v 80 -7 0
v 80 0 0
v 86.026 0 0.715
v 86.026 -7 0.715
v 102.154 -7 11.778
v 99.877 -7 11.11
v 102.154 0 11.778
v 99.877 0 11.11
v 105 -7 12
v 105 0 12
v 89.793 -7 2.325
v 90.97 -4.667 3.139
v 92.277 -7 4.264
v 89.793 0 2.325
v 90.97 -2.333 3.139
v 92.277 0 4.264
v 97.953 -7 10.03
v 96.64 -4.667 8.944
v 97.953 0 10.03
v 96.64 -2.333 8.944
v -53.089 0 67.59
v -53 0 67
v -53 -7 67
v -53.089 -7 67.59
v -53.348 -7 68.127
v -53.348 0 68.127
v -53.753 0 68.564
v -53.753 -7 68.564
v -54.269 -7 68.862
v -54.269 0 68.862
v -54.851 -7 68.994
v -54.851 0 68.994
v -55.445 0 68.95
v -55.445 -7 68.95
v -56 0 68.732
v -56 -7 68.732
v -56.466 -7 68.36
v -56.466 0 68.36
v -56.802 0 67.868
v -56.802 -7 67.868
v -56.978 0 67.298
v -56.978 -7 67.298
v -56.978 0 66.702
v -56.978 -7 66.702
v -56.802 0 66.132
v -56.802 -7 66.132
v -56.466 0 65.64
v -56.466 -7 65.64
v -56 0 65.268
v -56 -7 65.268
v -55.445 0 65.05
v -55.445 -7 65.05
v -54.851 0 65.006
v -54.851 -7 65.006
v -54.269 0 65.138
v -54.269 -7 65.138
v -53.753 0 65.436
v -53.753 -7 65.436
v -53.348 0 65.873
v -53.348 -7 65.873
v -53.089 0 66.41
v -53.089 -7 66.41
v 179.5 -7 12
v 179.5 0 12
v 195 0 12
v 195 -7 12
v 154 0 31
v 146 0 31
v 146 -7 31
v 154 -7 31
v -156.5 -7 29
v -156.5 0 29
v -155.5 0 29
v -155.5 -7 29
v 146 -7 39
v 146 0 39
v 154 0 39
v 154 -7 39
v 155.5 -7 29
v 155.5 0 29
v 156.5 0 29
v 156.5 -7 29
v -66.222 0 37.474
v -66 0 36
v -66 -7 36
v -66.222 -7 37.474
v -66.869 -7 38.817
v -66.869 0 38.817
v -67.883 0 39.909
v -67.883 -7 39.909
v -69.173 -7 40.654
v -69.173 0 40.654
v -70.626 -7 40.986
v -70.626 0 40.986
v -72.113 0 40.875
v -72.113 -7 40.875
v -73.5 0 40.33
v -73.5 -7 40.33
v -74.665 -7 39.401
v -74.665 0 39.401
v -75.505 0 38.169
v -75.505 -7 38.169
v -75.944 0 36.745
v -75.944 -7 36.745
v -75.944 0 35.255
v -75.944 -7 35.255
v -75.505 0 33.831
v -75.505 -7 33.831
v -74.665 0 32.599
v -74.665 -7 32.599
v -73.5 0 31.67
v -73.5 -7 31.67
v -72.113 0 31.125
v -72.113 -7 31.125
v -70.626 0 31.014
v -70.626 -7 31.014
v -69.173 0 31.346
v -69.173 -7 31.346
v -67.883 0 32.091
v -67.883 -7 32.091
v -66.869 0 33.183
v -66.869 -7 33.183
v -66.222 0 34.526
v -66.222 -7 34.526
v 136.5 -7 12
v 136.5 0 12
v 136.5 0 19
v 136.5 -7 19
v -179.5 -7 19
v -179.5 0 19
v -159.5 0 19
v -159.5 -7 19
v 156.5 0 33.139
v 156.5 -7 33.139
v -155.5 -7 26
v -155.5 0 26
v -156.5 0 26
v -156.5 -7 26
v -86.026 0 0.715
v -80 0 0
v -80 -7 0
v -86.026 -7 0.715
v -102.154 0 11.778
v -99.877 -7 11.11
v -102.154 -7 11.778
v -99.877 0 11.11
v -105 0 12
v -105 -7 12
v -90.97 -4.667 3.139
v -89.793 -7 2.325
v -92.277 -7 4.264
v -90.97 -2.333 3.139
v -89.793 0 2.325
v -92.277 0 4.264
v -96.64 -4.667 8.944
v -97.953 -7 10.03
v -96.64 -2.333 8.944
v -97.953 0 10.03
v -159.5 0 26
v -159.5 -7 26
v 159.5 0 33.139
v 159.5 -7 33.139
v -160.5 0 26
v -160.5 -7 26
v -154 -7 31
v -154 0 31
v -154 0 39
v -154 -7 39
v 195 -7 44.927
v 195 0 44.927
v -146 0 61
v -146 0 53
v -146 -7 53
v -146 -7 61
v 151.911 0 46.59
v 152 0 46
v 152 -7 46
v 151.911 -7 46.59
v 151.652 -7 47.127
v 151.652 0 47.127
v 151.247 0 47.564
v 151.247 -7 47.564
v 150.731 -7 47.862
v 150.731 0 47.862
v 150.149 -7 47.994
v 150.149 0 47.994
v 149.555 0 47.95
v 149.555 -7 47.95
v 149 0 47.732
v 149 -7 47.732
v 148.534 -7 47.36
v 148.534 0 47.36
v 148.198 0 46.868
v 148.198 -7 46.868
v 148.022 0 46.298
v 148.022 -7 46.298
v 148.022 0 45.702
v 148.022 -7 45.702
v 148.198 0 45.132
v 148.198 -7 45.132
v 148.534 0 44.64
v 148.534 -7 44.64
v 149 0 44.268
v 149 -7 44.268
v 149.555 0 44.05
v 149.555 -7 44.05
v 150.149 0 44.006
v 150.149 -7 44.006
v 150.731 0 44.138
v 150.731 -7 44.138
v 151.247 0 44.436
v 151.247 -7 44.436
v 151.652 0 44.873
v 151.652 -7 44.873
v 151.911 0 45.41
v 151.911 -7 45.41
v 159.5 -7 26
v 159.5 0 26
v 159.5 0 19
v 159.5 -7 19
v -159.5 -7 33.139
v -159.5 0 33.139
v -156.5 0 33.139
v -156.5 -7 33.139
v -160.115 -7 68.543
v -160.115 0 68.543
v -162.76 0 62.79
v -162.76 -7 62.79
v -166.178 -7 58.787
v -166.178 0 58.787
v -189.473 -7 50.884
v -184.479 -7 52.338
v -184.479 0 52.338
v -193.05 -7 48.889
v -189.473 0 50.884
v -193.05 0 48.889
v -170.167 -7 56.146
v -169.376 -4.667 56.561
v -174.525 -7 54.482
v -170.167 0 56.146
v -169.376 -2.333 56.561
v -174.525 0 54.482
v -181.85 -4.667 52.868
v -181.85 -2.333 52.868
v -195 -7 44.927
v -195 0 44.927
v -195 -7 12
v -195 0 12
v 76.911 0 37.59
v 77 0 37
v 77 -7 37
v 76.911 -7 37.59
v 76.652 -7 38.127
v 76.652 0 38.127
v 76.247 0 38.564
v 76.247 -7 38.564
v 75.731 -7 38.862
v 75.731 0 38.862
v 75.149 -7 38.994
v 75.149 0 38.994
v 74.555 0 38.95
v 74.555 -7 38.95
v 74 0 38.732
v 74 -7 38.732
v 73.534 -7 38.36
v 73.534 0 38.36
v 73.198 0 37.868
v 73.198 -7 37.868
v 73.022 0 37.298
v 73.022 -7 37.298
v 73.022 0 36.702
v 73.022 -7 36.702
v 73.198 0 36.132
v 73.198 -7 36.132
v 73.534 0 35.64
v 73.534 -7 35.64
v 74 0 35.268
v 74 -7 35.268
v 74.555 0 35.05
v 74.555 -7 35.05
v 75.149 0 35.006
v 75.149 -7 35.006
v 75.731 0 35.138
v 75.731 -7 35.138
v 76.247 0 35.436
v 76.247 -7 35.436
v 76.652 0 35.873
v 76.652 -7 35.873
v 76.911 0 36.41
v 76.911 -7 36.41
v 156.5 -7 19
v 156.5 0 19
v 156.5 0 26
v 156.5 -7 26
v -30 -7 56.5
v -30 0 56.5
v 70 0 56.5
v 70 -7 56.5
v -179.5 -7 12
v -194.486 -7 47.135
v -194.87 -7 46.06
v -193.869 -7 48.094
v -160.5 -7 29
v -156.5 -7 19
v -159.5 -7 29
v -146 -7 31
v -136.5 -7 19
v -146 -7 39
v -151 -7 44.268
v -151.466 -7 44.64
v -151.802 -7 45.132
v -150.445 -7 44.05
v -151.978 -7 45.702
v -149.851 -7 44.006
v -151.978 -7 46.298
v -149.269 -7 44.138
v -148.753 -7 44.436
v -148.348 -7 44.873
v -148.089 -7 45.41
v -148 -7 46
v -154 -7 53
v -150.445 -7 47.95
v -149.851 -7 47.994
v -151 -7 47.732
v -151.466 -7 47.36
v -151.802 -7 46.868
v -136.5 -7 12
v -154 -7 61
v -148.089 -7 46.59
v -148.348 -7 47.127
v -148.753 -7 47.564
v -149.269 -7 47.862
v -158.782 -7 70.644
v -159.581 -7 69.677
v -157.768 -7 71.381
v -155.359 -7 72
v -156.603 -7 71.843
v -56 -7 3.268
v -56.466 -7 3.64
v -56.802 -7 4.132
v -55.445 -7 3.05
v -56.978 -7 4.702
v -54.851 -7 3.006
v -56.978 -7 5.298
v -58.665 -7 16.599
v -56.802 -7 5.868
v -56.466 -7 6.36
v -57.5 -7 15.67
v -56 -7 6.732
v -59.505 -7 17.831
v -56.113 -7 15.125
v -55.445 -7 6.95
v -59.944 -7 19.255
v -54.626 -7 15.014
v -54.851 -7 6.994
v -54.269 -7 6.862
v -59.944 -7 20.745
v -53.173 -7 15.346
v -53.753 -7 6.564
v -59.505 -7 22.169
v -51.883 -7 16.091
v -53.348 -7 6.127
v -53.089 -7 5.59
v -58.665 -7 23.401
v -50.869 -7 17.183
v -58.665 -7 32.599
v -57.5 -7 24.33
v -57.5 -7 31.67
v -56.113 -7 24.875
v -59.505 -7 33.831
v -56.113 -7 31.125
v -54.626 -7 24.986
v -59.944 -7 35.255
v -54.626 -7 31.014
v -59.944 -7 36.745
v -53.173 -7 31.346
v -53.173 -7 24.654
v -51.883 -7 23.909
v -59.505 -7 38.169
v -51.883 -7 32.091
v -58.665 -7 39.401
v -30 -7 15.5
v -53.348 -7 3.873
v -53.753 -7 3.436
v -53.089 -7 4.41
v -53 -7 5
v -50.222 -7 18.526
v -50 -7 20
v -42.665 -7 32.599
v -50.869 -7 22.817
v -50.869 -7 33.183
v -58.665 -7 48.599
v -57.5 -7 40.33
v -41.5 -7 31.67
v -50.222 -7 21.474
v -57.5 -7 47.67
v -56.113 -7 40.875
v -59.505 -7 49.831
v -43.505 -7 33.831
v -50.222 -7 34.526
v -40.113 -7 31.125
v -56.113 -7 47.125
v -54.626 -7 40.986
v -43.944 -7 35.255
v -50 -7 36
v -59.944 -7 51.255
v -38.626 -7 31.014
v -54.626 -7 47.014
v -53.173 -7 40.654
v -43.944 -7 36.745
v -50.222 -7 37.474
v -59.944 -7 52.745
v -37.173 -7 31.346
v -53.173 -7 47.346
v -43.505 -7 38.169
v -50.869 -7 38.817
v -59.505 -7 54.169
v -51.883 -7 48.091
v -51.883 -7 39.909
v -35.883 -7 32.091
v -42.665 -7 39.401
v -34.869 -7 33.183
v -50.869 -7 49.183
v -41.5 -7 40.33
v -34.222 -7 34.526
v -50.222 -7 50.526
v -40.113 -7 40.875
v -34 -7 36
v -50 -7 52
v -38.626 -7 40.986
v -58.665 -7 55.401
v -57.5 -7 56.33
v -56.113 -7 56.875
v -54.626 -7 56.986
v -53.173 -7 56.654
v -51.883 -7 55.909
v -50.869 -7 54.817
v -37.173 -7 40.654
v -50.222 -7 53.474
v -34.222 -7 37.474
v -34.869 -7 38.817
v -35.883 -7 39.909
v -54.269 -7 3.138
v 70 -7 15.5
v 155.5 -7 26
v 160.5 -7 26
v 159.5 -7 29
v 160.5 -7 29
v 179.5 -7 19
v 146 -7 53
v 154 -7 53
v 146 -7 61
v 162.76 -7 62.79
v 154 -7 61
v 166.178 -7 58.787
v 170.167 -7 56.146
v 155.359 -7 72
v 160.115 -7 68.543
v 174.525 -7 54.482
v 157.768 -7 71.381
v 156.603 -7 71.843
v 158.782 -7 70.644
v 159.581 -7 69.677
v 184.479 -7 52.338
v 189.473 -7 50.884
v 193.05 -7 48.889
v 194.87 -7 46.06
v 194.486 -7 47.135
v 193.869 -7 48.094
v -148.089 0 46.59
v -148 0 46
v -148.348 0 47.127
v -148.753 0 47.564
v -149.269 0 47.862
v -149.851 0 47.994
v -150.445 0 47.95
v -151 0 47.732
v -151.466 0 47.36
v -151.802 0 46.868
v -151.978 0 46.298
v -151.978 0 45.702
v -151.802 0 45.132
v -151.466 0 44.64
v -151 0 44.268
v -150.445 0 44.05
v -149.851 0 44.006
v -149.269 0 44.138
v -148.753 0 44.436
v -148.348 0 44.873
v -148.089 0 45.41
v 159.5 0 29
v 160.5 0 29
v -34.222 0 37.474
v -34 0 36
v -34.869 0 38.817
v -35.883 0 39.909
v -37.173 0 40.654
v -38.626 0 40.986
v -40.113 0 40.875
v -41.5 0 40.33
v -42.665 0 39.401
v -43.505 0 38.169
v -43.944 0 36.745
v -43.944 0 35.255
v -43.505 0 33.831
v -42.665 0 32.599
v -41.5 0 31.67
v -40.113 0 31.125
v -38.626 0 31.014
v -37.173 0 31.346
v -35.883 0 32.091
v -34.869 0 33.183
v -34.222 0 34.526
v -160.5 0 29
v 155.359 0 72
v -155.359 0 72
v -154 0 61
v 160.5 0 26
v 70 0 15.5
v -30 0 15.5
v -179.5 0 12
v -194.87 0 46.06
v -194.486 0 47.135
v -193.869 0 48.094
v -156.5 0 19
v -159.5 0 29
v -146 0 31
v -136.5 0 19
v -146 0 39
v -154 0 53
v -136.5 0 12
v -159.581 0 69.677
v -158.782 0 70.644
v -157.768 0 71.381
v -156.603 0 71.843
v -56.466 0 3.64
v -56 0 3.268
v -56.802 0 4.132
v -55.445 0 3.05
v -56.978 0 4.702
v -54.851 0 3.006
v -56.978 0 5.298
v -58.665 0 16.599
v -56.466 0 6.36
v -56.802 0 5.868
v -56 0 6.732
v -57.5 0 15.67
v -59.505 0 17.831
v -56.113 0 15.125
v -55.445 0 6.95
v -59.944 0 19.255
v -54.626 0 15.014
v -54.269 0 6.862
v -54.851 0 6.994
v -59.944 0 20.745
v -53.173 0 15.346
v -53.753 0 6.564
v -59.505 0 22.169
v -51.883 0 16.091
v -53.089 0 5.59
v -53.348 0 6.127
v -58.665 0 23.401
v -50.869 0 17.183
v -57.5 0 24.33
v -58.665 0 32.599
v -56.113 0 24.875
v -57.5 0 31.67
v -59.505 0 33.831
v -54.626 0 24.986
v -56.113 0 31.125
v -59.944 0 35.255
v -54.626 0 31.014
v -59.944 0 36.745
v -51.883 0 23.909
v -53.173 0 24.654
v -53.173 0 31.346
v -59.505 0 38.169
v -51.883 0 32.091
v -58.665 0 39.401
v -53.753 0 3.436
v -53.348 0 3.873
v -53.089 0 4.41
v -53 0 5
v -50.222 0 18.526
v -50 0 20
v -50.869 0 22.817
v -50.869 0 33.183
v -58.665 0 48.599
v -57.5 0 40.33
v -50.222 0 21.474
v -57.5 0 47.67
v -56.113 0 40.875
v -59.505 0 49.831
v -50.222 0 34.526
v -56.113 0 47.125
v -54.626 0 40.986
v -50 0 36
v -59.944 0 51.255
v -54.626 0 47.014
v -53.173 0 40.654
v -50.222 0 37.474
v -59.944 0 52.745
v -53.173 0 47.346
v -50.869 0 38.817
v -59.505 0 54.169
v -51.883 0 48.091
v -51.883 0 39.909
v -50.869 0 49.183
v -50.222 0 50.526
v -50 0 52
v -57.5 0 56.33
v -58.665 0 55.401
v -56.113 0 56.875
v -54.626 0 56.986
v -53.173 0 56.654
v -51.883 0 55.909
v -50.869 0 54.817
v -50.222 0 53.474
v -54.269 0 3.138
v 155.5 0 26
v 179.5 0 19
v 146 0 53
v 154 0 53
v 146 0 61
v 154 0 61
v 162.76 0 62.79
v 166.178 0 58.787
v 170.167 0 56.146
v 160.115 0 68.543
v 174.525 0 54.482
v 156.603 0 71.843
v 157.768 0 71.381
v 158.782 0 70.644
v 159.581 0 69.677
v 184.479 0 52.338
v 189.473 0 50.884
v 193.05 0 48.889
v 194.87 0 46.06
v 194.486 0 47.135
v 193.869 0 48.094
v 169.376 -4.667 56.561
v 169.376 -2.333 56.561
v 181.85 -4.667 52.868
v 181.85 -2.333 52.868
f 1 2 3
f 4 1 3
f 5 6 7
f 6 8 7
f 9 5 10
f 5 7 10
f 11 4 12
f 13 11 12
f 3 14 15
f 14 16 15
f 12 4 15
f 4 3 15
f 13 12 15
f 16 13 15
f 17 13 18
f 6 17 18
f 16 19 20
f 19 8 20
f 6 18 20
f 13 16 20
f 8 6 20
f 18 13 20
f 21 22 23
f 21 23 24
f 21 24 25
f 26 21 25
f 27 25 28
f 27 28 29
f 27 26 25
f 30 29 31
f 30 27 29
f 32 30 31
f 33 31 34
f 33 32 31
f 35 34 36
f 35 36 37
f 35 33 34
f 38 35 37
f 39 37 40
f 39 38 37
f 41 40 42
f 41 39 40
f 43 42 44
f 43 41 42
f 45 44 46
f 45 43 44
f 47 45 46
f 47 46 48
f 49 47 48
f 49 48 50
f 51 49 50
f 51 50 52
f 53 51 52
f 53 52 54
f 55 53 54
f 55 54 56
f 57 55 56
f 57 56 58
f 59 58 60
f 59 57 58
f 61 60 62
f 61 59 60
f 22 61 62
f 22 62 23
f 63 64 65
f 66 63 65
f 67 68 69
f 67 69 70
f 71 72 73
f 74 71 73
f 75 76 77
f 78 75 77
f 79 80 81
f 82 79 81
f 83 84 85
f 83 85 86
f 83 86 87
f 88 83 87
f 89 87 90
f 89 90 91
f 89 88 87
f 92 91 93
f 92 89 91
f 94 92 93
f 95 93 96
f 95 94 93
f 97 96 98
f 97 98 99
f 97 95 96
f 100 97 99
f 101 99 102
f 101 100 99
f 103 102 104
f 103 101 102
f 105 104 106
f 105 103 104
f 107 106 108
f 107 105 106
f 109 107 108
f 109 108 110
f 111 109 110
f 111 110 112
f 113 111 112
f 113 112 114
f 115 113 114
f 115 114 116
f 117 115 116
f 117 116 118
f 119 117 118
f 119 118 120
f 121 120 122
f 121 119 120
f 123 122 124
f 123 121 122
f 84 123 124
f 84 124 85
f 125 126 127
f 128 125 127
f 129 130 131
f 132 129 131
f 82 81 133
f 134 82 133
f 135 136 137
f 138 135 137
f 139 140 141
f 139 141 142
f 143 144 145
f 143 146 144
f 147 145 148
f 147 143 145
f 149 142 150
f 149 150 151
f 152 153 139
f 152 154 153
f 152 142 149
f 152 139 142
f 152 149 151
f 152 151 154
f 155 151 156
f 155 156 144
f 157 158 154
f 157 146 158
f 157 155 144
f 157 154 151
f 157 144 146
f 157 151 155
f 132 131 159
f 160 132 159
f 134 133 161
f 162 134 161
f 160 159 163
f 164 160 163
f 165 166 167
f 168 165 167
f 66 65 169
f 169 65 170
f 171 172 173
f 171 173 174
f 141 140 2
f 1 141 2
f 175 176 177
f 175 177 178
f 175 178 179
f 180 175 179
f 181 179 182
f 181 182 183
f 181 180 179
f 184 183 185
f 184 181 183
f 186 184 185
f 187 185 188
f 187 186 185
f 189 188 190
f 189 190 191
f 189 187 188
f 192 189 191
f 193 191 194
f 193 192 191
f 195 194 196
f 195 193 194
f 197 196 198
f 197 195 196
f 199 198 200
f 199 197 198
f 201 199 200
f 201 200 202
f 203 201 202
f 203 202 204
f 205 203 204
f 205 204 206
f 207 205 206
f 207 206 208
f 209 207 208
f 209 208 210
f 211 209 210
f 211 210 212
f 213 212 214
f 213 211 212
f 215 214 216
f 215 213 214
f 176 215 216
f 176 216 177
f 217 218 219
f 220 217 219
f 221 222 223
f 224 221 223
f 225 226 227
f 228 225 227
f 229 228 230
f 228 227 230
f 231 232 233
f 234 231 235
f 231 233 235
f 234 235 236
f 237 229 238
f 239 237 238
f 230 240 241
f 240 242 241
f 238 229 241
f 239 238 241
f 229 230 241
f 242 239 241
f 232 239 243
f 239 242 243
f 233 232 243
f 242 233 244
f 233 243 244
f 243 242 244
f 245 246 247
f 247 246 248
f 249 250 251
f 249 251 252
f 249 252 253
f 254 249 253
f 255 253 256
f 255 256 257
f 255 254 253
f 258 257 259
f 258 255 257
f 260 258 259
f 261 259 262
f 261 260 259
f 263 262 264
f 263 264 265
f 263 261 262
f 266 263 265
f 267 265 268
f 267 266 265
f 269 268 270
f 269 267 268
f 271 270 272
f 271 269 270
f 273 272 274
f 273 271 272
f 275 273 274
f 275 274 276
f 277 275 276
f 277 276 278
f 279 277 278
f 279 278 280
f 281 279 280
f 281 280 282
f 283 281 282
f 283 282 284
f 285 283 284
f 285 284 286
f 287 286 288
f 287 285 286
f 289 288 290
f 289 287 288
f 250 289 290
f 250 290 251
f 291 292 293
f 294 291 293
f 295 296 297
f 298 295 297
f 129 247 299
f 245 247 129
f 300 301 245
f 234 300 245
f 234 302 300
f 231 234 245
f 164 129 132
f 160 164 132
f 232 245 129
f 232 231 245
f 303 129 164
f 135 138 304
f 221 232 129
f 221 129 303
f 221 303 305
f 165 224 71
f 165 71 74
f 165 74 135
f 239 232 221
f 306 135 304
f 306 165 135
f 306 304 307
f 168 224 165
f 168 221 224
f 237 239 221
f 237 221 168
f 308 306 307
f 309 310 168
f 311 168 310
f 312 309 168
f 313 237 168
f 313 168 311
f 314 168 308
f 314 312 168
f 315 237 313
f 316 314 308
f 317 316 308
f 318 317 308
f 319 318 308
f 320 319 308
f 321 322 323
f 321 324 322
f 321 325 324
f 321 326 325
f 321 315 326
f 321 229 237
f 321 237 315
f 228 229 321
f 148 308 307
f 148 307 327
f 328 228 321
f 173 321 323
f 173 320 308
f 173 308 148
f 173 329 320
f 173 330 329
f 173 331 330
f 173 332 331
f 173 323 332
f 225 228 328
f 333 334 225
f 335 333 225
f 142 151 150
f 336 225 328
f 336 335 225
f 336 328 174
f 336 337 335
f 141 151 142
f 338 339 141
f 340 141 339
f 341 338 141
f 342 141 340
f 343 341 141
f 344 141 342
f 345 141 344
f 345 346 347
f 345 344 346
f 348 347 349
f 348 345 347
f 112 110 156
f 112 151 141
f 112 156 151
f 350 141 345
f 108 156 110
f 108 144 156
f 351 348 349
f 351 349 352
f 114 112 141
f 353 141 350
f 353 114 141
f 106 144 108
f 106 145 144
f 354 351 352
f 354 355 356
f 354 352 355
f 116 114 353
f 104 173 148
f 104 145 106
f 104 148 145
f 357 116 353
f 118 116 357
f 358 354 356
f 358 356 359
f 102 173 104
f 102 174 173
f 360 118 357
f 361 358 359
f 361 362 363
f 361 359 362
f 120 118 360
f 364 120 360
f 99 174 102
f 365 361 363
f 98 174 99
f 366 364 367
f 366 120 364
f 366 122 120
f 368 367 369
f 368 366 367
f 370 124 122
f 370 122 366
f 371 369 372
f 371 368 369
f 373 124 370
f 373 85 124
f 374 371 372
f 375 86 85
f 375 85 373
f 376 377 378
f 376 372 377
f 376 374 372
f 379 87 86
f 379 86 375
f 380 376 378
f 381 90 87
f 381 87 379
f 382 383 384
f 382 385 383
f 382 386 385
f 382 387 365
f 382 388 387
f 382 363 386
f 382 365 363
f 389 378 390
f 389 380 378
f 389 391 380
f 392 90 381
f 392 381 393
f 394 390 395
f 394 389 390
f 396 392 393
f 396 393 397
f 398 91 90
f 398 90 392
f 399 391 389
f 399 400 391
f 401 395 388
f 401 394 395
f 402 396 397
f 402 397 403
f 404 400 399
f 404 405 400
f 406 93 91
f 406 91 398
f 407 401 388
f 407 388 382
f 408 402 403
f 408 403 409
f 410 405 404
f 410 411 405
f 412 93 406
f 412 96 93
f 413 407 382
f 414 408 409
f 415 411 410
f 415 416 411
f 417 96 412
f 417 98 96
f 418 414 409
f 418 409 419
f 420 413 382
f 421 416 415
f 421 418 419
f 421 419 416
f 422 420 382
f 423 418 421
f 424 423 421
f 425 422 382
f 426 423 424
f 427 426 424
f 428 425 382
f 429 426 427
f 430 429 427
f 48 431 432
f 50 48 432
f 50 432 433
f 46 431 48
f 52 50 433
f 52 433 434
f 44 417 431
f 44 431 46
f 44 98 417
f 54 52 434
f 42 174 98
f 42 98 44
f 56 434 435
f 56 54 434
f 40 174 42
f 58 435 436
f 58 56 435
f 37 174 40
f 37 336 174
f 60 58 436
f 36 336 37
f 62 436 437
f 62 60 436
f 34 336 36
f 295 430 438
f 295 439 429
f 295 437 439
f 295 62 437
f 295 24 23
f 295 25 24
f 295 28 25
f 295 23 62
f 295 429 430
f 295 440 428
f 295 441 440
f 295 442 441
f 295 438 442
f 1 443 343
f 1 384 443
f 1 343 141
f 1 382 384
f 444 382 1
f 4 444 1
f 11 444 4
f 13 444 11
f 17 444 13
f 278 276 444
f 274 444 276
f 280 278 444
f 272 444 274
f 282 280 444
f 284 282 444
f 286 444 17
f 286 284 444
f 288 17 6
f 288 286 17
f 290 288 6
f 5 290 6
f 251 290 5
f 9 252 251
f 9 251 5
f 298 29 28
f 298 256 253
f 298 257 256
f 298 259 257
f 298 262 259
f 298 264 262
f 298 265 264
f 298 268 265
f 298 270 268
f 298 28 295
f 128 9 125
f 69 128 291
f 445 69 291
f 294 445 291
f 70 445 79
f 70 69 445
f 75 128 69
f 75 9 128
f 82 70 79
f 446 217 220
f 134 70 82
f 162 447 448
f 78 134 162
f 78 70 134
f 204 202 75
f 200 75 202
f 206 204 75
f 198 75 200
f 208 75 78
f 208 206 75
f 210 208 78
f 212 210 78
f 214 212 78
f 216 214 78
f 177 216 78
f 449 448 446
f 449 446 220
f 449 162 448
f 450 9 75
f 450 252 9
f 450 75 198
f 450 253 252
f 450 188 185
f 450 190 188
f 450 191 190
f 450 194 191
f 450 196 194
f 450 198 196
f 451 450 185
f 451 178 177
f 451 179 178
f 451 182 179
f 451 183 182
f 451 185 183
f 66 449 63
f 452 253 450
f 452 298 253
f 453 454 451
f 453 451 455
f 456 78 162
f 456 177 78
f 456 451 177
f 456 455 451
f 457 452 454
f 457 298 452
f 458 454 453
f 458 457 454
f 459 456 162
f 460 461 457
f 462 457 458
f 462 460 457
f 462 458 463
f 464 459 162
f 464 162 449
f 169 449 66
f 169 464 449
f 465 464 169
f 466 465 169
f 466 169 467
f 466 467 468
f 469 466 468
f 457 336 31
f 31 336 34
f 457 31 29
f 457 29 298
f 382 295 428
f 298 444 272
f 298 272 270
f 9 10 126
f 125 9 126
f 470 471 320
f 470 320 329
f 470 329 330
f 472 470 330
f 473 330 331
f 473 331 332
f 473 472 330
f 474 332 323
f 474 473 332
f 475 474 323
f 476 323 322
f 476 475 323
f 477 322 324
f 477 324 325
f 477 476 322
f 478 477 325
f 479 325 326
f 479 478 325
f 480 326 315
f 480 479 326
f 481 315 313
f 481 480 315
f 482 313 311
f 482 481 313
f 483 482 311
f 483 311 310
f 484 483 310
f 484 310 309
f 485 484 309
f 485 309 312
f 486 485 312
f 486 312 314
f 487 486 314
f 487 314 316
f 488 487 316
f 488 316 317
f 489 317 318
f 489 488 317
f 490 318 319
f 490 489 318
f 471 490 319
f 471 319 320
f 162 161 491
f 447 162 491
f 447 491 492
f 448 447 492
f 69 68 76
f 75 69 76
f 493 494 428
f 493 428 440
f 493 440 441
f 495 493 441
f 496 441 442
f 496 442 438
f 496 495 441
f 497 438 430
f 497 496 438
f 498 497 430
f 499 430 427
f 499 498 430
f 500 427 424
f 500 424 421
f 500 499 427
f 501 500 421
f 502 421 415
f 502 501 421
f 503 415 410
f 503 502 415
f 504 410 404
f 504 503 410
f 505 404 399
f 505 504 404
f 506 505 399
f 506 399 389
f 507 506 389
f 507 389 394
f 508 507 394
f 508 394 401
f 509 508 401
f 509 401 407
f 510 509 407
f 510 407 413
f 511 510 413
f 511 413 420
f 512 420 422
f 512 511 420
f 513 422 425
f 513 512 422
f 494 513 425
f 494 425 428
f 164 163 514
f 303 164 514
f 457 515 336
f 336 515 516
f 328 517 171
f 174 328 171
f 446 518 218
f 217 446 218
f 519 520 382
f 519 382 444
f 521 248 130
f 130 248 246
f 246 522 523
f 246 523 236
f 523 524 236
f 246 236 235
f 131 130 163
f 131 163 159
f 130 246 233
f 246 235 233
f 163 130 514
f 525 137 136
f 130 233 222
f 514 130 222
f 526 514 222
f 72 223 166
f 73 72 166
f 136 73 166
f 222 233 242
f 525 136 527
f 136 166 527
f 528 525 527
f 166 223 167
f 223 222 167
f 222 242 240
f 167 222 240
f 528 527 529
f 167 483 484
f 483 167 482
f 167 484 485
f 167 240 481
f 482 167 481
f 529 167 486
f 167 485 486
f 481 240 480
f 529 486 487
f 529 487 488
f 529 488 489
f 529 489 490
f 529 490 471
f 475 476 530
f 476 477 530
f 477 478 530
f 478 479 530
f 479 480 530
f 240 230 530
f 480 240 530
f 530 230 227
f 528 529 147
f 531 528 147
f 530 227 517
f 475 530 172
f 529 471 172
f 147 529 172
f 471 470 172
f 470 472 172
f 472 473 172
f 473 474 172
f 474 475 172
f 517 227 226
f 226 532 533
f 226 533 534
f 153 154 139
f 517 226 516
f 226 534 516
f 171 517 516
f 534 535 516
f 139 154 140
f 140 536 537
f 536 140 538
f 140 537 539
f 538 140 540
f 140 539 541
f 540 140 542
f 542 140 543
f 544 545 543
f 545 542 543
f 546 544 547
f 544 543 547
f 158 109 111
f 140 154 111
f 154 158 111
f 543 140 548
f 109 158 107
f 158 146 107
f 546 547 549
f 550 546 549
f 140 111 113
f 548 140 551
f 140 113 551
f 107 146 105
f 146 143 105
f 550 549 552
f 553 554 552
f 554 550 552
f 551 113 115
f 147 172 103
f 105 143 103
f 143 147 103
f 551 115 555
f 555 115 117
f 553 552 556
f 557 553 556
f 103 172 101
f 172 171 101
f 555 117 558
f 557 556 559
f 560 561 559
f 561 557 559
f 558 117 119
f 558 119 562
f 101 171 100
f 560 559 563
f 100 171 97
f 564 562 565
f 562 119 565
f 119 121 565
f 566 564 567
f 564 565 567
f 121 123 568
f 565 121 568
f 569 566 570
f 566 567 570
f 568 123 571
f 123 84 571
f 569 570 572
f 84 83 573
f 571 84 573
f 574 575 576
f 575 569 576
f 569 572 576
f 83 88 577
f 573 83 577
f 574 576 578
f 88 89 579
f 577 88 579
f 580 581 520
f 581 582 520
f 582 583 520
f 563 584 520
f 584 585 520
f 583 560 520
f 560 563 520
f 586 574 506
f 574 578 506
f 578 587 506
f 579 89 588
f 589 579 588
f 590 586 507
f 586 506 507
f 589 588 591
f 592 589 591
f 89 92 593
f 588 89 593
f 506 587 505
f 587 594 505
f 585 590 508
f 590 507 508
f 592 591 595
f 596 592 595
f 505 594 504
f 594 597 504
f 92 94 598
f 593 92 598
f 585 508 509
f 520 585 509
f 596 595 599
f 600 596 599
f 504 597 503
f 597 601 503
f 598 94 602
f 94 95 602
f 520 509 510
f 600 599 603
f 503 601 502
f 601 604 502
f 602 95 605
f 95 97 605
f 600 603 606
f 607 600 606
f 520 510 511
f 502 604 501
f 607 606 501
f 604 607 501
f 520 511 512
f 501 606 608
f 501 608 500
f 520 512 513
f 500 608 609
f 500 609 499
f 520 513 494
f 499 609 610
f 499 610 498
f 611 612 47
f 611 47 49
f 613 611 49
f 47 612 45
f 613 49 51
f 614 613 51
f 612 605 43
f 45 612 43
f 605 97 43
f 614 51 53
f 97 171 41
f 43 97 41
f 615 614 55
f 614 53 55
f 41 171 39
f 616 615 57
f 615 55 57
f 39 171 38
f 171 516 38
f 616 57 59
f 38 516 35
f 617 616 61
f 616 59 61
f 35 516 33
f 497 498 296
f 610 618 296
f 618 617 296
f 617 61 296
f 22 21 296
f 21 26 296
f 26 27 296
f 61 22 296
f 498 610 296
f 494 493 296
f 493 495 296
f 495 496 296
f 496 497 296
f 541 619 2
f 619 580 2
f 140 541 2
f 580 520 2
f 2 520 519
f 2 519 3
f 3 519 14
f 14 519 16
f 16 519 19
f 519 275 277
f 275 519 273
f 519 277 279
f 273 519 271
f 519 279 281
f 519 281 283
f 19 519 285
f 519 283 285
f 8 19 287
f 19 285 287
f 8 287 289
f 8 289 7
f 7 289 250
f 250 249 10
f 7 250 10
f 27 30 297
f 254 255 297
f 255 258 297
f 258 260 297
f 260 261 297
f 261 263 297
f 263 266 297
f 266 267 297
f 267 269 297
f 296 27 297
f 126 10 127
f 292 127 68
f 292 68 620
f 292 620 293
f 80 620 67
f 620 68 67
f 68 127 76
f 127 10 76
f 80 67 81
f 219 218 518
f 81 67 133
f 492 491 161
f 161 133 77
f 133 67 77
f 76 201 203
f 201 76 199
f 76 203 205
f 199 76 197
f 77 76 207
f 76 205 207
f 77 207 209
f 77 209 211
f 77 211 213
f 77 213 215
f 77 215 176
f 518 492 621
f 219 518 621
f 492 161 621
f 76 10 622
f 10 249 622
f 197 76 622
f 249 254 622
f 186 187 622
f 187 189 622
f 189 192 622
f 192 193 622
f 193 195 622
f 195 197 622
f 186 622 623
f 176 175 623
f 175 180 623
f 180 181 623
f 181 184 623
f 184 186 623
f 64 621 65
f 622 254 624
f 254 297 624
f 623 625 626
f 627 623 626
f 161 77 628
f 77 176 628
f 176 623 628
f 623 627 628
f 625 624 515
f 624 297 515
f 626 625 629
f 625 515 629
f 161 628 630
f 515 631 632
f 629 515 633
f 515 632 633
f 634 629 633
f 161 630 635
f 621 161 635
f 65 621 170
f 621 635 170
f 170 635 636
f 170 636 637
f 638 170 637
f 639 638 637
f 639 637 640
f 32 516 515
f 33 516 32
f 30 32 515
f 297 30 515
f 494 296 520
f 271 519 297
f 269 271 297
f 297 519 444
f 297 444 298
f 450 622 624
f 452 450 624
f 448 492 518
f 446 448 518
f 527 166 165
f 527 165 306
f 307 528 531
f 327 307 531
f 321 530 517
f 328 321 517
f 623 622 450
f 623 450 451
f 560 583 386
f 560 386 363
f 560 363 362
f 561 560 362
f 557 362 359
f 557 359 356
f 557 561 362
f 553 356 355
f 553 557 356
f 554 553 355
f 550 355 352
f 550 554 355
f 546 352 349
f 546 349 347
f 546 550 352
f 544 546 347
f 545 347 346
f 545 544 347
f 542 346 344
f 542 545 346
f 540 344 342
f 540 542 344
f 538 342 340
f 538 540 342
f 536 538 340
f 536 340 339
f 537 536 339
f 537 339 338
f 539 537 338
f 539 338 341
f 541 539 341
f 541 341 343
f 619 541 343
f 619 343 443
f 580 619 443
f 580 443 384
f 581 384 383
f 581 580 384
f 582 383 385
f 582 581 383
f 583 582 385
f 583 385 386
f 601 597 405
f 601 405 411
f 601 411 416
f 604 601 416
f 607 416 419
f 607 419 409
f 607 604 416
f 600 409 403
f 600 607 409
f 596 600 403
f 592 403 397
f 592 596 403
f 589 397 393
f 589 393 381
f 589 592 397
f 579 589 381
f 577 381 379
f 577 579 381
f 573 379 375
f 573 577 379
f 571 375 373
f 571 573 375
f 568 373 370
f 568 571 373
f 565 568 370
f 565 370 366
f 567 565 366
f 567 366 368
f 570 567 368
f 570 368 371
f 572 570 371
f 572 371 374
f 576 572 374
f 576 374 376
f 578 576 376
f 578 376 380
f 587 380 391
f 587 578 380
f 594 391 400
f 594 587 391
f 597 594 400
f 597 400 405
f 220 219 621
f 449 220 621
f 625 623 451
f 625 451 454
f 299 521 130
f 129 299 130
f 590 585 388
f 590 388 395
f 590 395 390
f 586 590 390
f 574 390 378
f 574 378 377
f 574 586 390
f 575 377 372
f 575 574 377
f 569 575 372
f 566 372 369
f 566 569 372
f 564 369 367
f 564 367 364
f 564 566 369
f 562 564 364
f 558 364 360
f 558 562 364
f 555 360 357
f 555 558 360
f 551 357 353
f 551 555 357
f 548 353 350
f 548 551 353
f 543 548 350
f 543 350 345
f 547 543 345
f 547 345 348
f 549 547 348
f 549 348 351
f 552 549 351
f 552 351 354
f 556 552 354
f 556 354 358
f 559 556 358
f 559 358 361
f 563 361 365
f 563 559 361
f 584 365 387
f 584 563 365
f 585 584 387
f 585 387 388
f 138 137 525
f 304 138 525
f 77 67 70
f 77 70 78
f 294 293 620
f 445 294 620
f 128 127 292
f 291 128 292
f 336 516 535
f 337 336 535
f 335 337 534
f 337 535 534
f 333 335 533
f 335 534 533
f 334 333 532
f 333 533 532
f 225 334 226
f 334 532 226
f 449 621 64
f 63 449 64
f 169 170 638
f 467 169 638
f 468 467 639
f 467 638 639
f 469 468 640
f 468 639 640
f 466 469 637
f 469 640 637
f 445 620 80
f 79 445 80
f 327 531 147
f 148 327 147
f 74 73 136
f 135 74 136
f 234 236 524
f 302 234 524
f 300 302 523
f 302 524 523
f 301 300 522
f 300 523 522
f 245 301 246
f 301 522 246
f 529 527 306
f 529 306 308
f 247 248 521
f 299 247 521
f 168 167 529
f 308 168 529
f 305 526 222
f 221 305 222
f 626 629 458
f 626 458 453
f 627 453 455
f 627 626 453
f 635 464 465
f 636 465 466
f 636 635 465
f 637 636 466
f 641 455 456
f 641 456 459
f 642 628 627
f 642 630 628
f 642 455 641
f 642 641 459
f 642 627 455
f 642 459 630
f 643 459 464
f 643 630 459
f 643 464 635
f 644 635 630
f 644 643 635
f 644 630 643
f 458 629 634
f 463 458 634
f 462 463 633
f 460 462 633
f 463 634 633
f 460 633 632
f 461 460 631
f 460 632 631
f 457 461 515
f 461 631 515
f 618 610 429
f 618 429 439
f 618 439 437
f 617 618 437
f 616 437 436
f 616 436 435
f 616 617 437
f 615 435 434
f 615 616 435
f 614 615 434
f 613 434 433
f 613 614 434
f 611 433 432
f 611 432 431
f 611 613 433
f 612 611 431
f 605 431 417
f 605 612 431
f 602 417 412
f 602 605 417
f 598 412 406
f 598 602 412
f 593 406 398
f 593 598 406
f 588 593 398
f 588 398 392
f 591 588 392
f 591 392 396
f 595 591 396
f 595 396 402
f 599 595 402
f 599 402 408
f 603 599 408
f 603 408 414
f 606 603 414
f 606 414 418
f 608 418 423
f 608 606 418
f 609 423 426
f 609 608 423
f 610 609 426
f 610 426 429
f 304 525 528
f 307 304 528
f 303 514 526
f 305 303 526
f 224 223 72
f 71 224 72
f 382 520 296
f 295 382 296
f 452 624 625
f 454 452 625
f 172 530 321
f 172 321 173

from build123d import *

# Parameters (mm, degrees)
F0_R     = 2
F0_W     = 8
F0_H     = 8
F0_R_2   = 5
F0_W_2   = 100
F0_H_2   = 41
F1_DEPTH = 7


with BuildPart() as f1:
    # F0 (on Front) → F1 (new body)
    with BuildSketch(Plane.XZ):
        with BuildLine():
            Line((-80, 0), (0, 0))
            Line((0, 0), (80, 0))
            add(Edge.make_bspline(
                [(80, 0), (96.28427, 0), (92.631489, 12.12483), (105, 12)],
                knots=[0, 0, 0, 0, 27.730849, 27.730849, 27.730849, 27.730849], degree=3))
            Line((105, 12), (136.5, 12))
            Line((136.5, 12), (136.5, 19))
            Line((136.5, 19), (156.5, 19))
            Line((156.5, 19), (156.5, 26))
            Line((156.5, 26), (155.5, 26))
            Line((155.5, 26), (155.5, 29))
            Line((155.5, 29), (156.5, 29))
            Line((156.5, 29), (156.5, 33.138553))
            Line((156.5, 33.138553), (158, 33.138553))
            Line((158, 33.138553), (159.5, 33.138553))
            Line((159.5, 33.138553), (159.5, 29))
            Line((159.5, 29), (160.5, 29))
            Line((160.5, 29), (160.5, 26))
            Line((160.5, 26), (159.5, 26))
            Line((159.5, 26), (159.5, 19))
            Line((159.5, 19), (179.5, 19))
            Line((179.5, 19), (179.5, 12))
            Line((179.5, 12), (195, 12))
            Line((195, 12), (195, 44.927057))
            ThreePointArc((195, 44.927057), (194.48614, 47.134895), (193.05018, 48.888925))
            add(Edge.make_bspline(
                [(160.114705, 68.542634), (166.272349, 49.558061), (183.983751, 55.869028), (193.05018, 48.888925)],
                knots=[2.170073, 2.170073, 2.170073, 2.170073, 40.679074, 40.679074, 40.679074, 40.679074], degree=3))
            ThreePointArc((160.114705, 68.542634), (158.298595, 71.044327), (155.358626, 72))
            Line((155.358626, 72), (0, 72))
            Line((0, 72), (-155.358626, 72))
            ThreePointArc((-155.358626, 72), (-158.298595, 71.044327), (-160.114705, 68.542634))
            add(Edge.make_bspline(
                [(-160.114705, 68.542634), (-166.272349, 49.558061), (-183.983751, 55.869028), (-193.05018, 48.888925)],
                knots=[2.170073, 2.170073, 2.170073, 2.170073, 40.679074, 40.679074, 40.679074, 40.679074], degree=3))
            ThreePointArc((-193.05018, 48.888925), (-194.48614, 47.134895), (-195, 44.927057))
            Line((-195, 44.927057), (-195, 12))
            Line((-195, 12), (-179.5, 12))
            Line((-179.5, 12), (-179.5, 19))
            Line((-179.5, 19), (-159.5, 19))
            Line((-159.5, 19), (-159.5, 26))
            Line((-159.5, 26), (-160.5, 26))
            Line((-160.5, 26), (-160.5, 29))
            Line((-160.5, 29), (-159.5, 29))
            Line((-159.5, 29), (-159.5, 33.138553))
            Line((-159.5, 33.138553), (-158, 33.138553))
            Line((-158, 33.138553), (-156.5, 33.138553))
            Line((-156.5, 33.138553), (-156.5, 29))
            Line((-156.5, 29), (-155.5, 29))
            Line((-155.5, 29), (-155.5, 26))
            Line((-155.5, 26), (-156.5, 26))
            Line((-156.5, 26), (-156.5, 19))
            Line((-156.5, 19), (-136.5, 19))
            Line((-136.5, 19), (-136.5, 12))
            Line((-136.5, 12), (-105, 12))
            add(Edge.make_bspline(
                [(-80, 0), (-96.28427, 0), (-92.631489, 12.12483), (-105, 12)],
                knots=[0, 0, 0, 0, 27.730849, 27.730849, 27.730849, 27.730849], degree=3))
        make_face()
        with Locations((-55, 5)):
            Circle(F0_R, mode=Mode.SUBTRACT)
        with Locations((-150, 35)):
            Rectangle(F0_W, F0_H, mode=Mode.SUBTRACT)
        with Locations((-55, 20)):
            Circle(F0_R_2, mode=Mode.SUBTRACT)
        with Locations((150, 35)):
            Rectangle(F0_W, F0_H, mode=Mode.SUBTRACT)
        with Locations((-150, 46)):
            Circle(F0_R, mode=Mode.SUBTRACT)
        with Locations((-71, 36)):
            Circle(F0_R_2, mode=Mode.SUBTRACT)
        with Locations((-55, 36)):
            Circle(F0_R_2, mode=Mode.SUBTRACT)
        with Locations((-39, 36)):
            Circle(F0_R_2, mode=Mode.SUBTRACT)
        with Locations((-55, 52)):
            Circle(F0_R_2, mode=Mode.SUBTRACT)
        with Locations((-150, 57)):
            Rectangle(F0_W, F0_H, mode=Mode.SUBTRACT)
        with Locations((-55, 67)):
            Circle(F0_R, mode=Mode.SUBTRACT)
        with Locations((20, 36)):
            Rectangle(F0_W_2, F0_H_2, mode=Mode.SUBTRACT)
        with Locations((75, 37)):
            Circle(F0_R, mode=Mode.SUBTRACT)
        with Locations((150, 46)):
            Circle(F0_R, mode=Mode.SUBTRACT)
        with Locations((150, 57)):
            Rectangle(F0_W, F0_H, mode=Mode.SUBTRACT)
    extrude(amount=F1_DEPTH)


solid = f1.part
